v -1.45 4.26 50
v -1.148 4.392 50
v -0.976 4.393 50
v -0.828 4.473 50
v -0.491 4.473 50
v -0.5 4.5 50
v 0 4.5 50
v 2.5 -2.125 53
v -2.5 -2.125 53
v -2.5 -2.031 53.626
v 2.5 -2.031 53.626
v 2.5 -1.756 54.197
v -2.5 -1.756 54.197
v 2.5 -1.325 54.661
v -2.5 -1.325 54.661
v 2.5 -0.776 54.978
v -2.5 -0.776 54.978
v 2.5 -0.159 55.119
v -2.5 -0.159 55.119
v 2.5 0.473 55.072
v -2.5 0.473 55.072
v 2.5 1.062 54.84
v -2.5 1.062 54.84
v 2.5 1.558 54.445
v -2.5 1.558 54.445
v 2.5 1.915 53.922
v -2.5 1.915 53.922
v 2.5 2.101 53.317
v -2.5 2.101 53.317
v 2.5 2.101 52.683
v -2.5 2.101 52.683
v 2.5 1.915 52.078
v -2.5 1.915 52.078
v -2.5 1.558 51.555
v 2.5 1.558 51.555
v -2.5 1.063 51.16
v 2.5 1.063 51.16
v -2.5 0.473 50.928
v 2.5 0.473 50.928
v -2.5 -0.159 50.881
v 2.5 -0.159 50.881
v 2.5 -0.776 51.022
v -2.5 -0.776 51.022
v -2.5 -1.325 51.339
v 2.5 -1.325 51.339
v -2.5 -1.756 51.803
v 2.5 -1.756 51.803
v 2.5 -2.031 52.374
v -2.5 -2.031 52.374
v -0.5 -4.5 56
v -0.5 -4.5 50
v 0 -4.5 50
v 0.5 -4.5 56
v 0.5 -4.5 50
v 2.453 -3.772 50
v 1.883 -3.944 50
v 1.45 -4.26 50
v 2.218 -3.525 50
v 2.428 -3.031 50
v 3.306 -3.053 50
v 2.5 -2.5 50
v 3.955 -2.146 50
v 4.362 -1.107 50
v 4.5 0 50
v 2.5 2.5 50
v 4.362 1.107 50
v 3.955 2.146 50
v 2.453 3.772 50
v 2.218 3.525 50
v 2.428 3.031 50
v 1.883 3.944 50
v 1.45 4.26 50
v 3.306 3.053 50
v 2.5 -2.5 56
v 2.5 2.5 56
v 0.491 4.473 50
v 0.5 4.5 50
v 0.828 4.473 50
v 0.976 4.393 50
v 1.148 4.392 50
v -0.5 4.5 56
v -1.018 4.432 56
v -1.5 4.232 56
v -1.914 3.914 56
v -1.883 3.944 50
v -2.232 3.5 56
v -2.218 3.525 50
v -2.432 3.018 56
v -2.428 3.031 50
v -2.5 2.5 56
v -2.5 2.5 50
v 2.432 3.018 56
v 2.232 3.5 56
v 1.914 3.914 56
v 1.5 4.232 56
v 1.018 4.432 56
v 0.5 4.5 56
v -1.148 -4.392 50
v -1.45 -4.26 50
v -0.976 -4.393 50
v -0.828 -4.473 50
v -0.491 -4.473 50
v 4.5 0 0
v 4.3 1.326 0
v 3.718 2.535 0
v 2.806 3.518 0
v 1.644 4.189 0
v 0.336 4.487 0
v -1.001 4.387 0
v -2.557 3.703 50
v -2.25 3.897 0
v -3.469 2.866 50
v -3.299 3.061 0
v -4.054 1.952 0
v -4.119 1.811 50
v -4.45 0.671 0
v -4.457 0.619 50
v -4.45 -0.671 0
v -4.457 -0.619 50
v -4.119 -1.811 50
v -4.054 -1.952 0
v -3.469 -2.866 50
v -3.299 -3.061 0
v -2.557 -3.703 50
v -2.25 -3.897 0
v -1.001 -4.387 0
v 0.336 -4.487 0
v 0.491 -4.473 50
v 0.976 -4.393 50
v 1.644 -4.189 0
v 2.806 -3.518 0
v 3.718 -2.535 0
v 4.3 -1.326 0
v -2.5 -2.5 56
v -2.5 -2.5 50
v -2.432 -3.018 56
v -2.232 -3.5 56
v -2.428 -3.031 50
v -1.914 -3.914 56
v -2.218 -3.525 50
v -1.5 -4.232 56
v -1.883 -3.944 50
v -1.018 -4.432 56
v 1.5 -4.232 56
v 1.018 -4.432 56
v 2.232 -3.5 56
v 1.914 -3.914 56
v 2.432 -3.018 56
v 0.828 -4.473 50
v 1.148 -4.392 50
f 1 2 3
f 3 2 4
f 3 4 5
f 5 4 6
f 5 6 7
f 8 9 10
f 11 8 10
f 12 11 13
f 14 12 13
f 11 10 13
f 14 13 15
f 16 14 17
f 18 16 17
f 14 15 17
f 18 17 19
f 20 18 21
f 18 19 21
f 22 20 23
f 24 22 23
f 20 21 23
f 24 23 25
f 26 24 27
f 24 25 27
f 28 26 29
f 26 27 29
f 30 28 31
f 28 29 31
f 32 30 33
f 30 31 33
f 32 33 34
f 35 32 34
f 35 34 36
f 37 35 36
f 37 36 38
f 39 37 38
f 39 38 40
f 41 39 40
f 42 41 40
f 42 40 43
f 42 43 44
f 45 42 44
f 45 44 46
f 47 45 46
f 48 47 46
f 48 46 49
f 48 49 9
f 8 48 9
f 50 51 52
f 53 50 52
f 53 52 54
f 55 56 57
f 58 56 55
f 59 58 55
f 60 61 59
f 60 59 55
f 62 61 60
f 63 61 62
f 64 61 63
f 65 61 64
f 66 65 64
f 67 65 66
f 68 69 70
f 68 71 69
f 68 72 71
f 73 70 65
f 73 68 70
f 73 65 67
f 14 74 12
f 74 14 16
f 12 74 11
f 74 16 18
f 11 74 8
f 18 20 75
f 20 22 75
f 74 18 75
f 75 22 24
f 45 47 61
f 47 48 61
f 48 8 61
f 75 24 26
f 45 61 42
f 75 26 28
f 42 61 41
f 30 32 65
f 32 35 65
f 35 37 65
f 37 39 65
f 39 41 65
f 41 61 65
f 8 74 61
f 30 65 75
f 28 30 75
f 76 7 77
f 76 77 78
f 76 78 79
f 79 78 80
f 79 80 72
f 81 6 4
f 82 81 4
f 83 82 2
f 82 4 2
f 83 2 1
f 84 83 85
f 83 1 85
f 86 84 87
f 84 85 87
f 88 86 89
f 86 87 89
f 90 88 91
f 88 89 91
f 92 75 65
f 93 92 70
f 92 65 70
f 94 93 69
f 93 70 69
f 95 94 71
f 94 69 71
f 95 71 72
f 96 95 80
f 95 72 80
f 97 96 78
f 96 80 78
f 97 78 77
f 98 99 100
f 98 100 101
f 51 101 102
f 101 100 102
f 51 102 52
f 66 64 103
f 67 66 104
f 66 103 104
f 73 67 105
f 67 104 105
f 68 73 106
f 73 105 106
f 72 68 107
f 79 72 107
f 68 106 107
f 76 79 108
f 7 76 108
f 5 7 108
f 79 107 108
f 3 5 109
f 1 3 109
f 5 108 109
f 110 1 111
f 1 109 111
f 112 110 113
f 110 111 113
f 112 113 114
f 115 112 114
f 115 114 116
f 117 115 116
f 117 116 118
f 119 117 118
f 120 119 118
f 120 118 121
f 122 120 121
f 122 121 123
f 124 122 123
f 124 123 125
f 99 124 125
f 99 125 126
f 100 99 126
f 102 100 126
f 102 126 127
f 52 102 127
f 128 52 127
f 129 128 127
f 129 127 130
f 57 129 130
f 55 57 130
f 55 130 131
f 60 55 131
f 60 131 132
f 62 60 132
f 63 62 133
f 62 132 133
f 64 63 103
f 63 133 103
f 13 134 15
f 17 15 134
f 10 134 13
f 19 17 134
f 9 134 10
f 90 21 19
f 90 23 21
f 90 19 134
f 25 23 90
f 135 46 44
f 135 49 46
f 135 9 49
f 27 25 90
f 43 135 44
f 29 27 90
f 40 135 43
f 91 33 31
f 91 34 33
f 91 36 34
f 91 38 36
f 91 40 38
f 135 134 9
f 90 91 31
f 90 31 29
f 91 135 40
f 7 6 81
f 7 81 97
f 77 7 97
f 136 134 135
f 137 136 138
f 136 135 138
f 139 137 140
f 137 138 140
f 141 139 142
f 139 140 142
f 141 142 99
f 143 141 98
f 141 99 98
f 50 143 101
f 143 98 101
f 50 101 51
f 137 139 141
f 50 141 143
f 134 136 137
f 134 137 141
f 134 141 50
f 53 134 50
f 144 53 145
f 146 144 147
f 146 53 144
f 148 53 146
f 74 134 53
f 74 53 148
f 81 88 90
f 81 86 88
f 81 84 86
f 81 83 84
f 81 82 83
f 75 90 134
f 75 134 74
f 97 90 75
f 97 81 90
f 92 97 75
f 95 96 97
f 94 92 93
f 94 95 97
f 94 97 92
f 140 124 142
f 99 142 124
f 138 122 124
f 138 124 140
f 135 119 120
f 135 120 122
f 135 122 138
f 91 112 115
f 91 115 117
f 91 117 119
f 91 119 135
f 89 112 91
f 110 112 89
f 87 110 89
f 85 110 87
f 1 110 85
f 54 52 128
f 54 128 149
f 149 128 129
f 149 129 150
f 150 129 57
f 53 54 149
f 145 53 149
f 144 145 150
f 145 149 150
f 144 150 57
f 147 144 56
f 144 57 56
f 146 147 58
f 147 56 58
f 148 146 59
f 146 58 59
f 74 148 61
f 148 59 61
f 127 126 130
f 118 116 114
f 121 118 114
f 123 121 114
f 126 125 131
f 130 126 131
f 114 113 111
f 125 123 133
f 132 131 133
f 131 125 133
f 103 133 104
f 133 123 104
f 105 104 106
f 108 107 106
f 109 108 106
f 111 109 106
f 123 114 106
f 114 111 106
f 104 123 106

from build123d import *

# Parameters (mm, degrees)
ESBO_O1_R                = 4.5
RESSALTO_EXTRUS_O1_DEPTH = 50
ESBO_O2_W                = 5
ESBO_O2_H                = 9
RESSALTO_EXTRUS_O2_DEPTH = 6
FILETE1_R                = 2
ESBO_O3_R                = 2.125
CORTE_EXTRUS_O1_DEPTH    = 6


with BuildPart() as part:
    # Esboço1 → Ressalto-extrusão1 (new body)
    with BuildSketch(Plane.XY):
        Circle(ESBO_O1_R)
    extrude(amount=RESSALTO_EXTRUS_O1_DEPTH)

    # Esboço2 → Ressalto-extrusão2 (add)
    with BuildSketch(Plane.XY.offset(50)):
        Rectangle(ESBO_O2_W, ESBO_O2_H)
    extrude(amount=RESSALTO_EXTRUS_O2_DEPTH)

    # Filete1
    # the kernel refuses this fillet: 2 mm, written as the material it takes off along each edge
    with BuildSketch(Plane(origin=(2.5, -4.5, 50), x_dir=(0, 1, 0), z_dir=(0, 0, 1)), Plane(origin=(-2.5, 4.5, 50), x_dir=(0, -1, 0), z_dir=(0, 0, 1)), Plane(origin=(-2.5, -4.5, 50), x_dir=(1, 0, 0), z_dir=(0, 0, 1))) as filete1_piece_1:
        with BuildLine():
            CenterArc((FILETE1_R, FILETE1_R), FILETE1_R, 180, 90)
            Line((0, FILETE1_R), (0, 0))
            Line((0, 0), (FILETE1_R, 0))
        make_face()
    extrude(amount=11, mode=Mode.SUBTRACT)
    with BuildSketch(Plane(origin=(2.5, 4.5, 50), x_dir=(0, -1, 0), z_dir=(0, 0, 1))) as filete1_piece_2:
        with BuildLine():
            CenterArc((FILETE1_R, -FILETE1_R), FILETE1_R, 90, 90)
            Line((0, -FILETE1_R), (0, 0))
            Line((0, 0), (FILETE1_R, 0))
        make_face()
    extrude(amount=11, mode=Mode.SUBTRACT)

    # Esboço3 → Corte-extrusão1 (cut)
    with BuildSketch(Plane.ZY.offset(2.5)):
        with Locations(Location((53, 0, 0), (0, 0, 270))):
            Circle(ESBO_O3_R)
    extrude(amount=-CORTE_EXTRUS_O1_DEPTH, mode=Mode.SUBTRACT)


solid = part.part
